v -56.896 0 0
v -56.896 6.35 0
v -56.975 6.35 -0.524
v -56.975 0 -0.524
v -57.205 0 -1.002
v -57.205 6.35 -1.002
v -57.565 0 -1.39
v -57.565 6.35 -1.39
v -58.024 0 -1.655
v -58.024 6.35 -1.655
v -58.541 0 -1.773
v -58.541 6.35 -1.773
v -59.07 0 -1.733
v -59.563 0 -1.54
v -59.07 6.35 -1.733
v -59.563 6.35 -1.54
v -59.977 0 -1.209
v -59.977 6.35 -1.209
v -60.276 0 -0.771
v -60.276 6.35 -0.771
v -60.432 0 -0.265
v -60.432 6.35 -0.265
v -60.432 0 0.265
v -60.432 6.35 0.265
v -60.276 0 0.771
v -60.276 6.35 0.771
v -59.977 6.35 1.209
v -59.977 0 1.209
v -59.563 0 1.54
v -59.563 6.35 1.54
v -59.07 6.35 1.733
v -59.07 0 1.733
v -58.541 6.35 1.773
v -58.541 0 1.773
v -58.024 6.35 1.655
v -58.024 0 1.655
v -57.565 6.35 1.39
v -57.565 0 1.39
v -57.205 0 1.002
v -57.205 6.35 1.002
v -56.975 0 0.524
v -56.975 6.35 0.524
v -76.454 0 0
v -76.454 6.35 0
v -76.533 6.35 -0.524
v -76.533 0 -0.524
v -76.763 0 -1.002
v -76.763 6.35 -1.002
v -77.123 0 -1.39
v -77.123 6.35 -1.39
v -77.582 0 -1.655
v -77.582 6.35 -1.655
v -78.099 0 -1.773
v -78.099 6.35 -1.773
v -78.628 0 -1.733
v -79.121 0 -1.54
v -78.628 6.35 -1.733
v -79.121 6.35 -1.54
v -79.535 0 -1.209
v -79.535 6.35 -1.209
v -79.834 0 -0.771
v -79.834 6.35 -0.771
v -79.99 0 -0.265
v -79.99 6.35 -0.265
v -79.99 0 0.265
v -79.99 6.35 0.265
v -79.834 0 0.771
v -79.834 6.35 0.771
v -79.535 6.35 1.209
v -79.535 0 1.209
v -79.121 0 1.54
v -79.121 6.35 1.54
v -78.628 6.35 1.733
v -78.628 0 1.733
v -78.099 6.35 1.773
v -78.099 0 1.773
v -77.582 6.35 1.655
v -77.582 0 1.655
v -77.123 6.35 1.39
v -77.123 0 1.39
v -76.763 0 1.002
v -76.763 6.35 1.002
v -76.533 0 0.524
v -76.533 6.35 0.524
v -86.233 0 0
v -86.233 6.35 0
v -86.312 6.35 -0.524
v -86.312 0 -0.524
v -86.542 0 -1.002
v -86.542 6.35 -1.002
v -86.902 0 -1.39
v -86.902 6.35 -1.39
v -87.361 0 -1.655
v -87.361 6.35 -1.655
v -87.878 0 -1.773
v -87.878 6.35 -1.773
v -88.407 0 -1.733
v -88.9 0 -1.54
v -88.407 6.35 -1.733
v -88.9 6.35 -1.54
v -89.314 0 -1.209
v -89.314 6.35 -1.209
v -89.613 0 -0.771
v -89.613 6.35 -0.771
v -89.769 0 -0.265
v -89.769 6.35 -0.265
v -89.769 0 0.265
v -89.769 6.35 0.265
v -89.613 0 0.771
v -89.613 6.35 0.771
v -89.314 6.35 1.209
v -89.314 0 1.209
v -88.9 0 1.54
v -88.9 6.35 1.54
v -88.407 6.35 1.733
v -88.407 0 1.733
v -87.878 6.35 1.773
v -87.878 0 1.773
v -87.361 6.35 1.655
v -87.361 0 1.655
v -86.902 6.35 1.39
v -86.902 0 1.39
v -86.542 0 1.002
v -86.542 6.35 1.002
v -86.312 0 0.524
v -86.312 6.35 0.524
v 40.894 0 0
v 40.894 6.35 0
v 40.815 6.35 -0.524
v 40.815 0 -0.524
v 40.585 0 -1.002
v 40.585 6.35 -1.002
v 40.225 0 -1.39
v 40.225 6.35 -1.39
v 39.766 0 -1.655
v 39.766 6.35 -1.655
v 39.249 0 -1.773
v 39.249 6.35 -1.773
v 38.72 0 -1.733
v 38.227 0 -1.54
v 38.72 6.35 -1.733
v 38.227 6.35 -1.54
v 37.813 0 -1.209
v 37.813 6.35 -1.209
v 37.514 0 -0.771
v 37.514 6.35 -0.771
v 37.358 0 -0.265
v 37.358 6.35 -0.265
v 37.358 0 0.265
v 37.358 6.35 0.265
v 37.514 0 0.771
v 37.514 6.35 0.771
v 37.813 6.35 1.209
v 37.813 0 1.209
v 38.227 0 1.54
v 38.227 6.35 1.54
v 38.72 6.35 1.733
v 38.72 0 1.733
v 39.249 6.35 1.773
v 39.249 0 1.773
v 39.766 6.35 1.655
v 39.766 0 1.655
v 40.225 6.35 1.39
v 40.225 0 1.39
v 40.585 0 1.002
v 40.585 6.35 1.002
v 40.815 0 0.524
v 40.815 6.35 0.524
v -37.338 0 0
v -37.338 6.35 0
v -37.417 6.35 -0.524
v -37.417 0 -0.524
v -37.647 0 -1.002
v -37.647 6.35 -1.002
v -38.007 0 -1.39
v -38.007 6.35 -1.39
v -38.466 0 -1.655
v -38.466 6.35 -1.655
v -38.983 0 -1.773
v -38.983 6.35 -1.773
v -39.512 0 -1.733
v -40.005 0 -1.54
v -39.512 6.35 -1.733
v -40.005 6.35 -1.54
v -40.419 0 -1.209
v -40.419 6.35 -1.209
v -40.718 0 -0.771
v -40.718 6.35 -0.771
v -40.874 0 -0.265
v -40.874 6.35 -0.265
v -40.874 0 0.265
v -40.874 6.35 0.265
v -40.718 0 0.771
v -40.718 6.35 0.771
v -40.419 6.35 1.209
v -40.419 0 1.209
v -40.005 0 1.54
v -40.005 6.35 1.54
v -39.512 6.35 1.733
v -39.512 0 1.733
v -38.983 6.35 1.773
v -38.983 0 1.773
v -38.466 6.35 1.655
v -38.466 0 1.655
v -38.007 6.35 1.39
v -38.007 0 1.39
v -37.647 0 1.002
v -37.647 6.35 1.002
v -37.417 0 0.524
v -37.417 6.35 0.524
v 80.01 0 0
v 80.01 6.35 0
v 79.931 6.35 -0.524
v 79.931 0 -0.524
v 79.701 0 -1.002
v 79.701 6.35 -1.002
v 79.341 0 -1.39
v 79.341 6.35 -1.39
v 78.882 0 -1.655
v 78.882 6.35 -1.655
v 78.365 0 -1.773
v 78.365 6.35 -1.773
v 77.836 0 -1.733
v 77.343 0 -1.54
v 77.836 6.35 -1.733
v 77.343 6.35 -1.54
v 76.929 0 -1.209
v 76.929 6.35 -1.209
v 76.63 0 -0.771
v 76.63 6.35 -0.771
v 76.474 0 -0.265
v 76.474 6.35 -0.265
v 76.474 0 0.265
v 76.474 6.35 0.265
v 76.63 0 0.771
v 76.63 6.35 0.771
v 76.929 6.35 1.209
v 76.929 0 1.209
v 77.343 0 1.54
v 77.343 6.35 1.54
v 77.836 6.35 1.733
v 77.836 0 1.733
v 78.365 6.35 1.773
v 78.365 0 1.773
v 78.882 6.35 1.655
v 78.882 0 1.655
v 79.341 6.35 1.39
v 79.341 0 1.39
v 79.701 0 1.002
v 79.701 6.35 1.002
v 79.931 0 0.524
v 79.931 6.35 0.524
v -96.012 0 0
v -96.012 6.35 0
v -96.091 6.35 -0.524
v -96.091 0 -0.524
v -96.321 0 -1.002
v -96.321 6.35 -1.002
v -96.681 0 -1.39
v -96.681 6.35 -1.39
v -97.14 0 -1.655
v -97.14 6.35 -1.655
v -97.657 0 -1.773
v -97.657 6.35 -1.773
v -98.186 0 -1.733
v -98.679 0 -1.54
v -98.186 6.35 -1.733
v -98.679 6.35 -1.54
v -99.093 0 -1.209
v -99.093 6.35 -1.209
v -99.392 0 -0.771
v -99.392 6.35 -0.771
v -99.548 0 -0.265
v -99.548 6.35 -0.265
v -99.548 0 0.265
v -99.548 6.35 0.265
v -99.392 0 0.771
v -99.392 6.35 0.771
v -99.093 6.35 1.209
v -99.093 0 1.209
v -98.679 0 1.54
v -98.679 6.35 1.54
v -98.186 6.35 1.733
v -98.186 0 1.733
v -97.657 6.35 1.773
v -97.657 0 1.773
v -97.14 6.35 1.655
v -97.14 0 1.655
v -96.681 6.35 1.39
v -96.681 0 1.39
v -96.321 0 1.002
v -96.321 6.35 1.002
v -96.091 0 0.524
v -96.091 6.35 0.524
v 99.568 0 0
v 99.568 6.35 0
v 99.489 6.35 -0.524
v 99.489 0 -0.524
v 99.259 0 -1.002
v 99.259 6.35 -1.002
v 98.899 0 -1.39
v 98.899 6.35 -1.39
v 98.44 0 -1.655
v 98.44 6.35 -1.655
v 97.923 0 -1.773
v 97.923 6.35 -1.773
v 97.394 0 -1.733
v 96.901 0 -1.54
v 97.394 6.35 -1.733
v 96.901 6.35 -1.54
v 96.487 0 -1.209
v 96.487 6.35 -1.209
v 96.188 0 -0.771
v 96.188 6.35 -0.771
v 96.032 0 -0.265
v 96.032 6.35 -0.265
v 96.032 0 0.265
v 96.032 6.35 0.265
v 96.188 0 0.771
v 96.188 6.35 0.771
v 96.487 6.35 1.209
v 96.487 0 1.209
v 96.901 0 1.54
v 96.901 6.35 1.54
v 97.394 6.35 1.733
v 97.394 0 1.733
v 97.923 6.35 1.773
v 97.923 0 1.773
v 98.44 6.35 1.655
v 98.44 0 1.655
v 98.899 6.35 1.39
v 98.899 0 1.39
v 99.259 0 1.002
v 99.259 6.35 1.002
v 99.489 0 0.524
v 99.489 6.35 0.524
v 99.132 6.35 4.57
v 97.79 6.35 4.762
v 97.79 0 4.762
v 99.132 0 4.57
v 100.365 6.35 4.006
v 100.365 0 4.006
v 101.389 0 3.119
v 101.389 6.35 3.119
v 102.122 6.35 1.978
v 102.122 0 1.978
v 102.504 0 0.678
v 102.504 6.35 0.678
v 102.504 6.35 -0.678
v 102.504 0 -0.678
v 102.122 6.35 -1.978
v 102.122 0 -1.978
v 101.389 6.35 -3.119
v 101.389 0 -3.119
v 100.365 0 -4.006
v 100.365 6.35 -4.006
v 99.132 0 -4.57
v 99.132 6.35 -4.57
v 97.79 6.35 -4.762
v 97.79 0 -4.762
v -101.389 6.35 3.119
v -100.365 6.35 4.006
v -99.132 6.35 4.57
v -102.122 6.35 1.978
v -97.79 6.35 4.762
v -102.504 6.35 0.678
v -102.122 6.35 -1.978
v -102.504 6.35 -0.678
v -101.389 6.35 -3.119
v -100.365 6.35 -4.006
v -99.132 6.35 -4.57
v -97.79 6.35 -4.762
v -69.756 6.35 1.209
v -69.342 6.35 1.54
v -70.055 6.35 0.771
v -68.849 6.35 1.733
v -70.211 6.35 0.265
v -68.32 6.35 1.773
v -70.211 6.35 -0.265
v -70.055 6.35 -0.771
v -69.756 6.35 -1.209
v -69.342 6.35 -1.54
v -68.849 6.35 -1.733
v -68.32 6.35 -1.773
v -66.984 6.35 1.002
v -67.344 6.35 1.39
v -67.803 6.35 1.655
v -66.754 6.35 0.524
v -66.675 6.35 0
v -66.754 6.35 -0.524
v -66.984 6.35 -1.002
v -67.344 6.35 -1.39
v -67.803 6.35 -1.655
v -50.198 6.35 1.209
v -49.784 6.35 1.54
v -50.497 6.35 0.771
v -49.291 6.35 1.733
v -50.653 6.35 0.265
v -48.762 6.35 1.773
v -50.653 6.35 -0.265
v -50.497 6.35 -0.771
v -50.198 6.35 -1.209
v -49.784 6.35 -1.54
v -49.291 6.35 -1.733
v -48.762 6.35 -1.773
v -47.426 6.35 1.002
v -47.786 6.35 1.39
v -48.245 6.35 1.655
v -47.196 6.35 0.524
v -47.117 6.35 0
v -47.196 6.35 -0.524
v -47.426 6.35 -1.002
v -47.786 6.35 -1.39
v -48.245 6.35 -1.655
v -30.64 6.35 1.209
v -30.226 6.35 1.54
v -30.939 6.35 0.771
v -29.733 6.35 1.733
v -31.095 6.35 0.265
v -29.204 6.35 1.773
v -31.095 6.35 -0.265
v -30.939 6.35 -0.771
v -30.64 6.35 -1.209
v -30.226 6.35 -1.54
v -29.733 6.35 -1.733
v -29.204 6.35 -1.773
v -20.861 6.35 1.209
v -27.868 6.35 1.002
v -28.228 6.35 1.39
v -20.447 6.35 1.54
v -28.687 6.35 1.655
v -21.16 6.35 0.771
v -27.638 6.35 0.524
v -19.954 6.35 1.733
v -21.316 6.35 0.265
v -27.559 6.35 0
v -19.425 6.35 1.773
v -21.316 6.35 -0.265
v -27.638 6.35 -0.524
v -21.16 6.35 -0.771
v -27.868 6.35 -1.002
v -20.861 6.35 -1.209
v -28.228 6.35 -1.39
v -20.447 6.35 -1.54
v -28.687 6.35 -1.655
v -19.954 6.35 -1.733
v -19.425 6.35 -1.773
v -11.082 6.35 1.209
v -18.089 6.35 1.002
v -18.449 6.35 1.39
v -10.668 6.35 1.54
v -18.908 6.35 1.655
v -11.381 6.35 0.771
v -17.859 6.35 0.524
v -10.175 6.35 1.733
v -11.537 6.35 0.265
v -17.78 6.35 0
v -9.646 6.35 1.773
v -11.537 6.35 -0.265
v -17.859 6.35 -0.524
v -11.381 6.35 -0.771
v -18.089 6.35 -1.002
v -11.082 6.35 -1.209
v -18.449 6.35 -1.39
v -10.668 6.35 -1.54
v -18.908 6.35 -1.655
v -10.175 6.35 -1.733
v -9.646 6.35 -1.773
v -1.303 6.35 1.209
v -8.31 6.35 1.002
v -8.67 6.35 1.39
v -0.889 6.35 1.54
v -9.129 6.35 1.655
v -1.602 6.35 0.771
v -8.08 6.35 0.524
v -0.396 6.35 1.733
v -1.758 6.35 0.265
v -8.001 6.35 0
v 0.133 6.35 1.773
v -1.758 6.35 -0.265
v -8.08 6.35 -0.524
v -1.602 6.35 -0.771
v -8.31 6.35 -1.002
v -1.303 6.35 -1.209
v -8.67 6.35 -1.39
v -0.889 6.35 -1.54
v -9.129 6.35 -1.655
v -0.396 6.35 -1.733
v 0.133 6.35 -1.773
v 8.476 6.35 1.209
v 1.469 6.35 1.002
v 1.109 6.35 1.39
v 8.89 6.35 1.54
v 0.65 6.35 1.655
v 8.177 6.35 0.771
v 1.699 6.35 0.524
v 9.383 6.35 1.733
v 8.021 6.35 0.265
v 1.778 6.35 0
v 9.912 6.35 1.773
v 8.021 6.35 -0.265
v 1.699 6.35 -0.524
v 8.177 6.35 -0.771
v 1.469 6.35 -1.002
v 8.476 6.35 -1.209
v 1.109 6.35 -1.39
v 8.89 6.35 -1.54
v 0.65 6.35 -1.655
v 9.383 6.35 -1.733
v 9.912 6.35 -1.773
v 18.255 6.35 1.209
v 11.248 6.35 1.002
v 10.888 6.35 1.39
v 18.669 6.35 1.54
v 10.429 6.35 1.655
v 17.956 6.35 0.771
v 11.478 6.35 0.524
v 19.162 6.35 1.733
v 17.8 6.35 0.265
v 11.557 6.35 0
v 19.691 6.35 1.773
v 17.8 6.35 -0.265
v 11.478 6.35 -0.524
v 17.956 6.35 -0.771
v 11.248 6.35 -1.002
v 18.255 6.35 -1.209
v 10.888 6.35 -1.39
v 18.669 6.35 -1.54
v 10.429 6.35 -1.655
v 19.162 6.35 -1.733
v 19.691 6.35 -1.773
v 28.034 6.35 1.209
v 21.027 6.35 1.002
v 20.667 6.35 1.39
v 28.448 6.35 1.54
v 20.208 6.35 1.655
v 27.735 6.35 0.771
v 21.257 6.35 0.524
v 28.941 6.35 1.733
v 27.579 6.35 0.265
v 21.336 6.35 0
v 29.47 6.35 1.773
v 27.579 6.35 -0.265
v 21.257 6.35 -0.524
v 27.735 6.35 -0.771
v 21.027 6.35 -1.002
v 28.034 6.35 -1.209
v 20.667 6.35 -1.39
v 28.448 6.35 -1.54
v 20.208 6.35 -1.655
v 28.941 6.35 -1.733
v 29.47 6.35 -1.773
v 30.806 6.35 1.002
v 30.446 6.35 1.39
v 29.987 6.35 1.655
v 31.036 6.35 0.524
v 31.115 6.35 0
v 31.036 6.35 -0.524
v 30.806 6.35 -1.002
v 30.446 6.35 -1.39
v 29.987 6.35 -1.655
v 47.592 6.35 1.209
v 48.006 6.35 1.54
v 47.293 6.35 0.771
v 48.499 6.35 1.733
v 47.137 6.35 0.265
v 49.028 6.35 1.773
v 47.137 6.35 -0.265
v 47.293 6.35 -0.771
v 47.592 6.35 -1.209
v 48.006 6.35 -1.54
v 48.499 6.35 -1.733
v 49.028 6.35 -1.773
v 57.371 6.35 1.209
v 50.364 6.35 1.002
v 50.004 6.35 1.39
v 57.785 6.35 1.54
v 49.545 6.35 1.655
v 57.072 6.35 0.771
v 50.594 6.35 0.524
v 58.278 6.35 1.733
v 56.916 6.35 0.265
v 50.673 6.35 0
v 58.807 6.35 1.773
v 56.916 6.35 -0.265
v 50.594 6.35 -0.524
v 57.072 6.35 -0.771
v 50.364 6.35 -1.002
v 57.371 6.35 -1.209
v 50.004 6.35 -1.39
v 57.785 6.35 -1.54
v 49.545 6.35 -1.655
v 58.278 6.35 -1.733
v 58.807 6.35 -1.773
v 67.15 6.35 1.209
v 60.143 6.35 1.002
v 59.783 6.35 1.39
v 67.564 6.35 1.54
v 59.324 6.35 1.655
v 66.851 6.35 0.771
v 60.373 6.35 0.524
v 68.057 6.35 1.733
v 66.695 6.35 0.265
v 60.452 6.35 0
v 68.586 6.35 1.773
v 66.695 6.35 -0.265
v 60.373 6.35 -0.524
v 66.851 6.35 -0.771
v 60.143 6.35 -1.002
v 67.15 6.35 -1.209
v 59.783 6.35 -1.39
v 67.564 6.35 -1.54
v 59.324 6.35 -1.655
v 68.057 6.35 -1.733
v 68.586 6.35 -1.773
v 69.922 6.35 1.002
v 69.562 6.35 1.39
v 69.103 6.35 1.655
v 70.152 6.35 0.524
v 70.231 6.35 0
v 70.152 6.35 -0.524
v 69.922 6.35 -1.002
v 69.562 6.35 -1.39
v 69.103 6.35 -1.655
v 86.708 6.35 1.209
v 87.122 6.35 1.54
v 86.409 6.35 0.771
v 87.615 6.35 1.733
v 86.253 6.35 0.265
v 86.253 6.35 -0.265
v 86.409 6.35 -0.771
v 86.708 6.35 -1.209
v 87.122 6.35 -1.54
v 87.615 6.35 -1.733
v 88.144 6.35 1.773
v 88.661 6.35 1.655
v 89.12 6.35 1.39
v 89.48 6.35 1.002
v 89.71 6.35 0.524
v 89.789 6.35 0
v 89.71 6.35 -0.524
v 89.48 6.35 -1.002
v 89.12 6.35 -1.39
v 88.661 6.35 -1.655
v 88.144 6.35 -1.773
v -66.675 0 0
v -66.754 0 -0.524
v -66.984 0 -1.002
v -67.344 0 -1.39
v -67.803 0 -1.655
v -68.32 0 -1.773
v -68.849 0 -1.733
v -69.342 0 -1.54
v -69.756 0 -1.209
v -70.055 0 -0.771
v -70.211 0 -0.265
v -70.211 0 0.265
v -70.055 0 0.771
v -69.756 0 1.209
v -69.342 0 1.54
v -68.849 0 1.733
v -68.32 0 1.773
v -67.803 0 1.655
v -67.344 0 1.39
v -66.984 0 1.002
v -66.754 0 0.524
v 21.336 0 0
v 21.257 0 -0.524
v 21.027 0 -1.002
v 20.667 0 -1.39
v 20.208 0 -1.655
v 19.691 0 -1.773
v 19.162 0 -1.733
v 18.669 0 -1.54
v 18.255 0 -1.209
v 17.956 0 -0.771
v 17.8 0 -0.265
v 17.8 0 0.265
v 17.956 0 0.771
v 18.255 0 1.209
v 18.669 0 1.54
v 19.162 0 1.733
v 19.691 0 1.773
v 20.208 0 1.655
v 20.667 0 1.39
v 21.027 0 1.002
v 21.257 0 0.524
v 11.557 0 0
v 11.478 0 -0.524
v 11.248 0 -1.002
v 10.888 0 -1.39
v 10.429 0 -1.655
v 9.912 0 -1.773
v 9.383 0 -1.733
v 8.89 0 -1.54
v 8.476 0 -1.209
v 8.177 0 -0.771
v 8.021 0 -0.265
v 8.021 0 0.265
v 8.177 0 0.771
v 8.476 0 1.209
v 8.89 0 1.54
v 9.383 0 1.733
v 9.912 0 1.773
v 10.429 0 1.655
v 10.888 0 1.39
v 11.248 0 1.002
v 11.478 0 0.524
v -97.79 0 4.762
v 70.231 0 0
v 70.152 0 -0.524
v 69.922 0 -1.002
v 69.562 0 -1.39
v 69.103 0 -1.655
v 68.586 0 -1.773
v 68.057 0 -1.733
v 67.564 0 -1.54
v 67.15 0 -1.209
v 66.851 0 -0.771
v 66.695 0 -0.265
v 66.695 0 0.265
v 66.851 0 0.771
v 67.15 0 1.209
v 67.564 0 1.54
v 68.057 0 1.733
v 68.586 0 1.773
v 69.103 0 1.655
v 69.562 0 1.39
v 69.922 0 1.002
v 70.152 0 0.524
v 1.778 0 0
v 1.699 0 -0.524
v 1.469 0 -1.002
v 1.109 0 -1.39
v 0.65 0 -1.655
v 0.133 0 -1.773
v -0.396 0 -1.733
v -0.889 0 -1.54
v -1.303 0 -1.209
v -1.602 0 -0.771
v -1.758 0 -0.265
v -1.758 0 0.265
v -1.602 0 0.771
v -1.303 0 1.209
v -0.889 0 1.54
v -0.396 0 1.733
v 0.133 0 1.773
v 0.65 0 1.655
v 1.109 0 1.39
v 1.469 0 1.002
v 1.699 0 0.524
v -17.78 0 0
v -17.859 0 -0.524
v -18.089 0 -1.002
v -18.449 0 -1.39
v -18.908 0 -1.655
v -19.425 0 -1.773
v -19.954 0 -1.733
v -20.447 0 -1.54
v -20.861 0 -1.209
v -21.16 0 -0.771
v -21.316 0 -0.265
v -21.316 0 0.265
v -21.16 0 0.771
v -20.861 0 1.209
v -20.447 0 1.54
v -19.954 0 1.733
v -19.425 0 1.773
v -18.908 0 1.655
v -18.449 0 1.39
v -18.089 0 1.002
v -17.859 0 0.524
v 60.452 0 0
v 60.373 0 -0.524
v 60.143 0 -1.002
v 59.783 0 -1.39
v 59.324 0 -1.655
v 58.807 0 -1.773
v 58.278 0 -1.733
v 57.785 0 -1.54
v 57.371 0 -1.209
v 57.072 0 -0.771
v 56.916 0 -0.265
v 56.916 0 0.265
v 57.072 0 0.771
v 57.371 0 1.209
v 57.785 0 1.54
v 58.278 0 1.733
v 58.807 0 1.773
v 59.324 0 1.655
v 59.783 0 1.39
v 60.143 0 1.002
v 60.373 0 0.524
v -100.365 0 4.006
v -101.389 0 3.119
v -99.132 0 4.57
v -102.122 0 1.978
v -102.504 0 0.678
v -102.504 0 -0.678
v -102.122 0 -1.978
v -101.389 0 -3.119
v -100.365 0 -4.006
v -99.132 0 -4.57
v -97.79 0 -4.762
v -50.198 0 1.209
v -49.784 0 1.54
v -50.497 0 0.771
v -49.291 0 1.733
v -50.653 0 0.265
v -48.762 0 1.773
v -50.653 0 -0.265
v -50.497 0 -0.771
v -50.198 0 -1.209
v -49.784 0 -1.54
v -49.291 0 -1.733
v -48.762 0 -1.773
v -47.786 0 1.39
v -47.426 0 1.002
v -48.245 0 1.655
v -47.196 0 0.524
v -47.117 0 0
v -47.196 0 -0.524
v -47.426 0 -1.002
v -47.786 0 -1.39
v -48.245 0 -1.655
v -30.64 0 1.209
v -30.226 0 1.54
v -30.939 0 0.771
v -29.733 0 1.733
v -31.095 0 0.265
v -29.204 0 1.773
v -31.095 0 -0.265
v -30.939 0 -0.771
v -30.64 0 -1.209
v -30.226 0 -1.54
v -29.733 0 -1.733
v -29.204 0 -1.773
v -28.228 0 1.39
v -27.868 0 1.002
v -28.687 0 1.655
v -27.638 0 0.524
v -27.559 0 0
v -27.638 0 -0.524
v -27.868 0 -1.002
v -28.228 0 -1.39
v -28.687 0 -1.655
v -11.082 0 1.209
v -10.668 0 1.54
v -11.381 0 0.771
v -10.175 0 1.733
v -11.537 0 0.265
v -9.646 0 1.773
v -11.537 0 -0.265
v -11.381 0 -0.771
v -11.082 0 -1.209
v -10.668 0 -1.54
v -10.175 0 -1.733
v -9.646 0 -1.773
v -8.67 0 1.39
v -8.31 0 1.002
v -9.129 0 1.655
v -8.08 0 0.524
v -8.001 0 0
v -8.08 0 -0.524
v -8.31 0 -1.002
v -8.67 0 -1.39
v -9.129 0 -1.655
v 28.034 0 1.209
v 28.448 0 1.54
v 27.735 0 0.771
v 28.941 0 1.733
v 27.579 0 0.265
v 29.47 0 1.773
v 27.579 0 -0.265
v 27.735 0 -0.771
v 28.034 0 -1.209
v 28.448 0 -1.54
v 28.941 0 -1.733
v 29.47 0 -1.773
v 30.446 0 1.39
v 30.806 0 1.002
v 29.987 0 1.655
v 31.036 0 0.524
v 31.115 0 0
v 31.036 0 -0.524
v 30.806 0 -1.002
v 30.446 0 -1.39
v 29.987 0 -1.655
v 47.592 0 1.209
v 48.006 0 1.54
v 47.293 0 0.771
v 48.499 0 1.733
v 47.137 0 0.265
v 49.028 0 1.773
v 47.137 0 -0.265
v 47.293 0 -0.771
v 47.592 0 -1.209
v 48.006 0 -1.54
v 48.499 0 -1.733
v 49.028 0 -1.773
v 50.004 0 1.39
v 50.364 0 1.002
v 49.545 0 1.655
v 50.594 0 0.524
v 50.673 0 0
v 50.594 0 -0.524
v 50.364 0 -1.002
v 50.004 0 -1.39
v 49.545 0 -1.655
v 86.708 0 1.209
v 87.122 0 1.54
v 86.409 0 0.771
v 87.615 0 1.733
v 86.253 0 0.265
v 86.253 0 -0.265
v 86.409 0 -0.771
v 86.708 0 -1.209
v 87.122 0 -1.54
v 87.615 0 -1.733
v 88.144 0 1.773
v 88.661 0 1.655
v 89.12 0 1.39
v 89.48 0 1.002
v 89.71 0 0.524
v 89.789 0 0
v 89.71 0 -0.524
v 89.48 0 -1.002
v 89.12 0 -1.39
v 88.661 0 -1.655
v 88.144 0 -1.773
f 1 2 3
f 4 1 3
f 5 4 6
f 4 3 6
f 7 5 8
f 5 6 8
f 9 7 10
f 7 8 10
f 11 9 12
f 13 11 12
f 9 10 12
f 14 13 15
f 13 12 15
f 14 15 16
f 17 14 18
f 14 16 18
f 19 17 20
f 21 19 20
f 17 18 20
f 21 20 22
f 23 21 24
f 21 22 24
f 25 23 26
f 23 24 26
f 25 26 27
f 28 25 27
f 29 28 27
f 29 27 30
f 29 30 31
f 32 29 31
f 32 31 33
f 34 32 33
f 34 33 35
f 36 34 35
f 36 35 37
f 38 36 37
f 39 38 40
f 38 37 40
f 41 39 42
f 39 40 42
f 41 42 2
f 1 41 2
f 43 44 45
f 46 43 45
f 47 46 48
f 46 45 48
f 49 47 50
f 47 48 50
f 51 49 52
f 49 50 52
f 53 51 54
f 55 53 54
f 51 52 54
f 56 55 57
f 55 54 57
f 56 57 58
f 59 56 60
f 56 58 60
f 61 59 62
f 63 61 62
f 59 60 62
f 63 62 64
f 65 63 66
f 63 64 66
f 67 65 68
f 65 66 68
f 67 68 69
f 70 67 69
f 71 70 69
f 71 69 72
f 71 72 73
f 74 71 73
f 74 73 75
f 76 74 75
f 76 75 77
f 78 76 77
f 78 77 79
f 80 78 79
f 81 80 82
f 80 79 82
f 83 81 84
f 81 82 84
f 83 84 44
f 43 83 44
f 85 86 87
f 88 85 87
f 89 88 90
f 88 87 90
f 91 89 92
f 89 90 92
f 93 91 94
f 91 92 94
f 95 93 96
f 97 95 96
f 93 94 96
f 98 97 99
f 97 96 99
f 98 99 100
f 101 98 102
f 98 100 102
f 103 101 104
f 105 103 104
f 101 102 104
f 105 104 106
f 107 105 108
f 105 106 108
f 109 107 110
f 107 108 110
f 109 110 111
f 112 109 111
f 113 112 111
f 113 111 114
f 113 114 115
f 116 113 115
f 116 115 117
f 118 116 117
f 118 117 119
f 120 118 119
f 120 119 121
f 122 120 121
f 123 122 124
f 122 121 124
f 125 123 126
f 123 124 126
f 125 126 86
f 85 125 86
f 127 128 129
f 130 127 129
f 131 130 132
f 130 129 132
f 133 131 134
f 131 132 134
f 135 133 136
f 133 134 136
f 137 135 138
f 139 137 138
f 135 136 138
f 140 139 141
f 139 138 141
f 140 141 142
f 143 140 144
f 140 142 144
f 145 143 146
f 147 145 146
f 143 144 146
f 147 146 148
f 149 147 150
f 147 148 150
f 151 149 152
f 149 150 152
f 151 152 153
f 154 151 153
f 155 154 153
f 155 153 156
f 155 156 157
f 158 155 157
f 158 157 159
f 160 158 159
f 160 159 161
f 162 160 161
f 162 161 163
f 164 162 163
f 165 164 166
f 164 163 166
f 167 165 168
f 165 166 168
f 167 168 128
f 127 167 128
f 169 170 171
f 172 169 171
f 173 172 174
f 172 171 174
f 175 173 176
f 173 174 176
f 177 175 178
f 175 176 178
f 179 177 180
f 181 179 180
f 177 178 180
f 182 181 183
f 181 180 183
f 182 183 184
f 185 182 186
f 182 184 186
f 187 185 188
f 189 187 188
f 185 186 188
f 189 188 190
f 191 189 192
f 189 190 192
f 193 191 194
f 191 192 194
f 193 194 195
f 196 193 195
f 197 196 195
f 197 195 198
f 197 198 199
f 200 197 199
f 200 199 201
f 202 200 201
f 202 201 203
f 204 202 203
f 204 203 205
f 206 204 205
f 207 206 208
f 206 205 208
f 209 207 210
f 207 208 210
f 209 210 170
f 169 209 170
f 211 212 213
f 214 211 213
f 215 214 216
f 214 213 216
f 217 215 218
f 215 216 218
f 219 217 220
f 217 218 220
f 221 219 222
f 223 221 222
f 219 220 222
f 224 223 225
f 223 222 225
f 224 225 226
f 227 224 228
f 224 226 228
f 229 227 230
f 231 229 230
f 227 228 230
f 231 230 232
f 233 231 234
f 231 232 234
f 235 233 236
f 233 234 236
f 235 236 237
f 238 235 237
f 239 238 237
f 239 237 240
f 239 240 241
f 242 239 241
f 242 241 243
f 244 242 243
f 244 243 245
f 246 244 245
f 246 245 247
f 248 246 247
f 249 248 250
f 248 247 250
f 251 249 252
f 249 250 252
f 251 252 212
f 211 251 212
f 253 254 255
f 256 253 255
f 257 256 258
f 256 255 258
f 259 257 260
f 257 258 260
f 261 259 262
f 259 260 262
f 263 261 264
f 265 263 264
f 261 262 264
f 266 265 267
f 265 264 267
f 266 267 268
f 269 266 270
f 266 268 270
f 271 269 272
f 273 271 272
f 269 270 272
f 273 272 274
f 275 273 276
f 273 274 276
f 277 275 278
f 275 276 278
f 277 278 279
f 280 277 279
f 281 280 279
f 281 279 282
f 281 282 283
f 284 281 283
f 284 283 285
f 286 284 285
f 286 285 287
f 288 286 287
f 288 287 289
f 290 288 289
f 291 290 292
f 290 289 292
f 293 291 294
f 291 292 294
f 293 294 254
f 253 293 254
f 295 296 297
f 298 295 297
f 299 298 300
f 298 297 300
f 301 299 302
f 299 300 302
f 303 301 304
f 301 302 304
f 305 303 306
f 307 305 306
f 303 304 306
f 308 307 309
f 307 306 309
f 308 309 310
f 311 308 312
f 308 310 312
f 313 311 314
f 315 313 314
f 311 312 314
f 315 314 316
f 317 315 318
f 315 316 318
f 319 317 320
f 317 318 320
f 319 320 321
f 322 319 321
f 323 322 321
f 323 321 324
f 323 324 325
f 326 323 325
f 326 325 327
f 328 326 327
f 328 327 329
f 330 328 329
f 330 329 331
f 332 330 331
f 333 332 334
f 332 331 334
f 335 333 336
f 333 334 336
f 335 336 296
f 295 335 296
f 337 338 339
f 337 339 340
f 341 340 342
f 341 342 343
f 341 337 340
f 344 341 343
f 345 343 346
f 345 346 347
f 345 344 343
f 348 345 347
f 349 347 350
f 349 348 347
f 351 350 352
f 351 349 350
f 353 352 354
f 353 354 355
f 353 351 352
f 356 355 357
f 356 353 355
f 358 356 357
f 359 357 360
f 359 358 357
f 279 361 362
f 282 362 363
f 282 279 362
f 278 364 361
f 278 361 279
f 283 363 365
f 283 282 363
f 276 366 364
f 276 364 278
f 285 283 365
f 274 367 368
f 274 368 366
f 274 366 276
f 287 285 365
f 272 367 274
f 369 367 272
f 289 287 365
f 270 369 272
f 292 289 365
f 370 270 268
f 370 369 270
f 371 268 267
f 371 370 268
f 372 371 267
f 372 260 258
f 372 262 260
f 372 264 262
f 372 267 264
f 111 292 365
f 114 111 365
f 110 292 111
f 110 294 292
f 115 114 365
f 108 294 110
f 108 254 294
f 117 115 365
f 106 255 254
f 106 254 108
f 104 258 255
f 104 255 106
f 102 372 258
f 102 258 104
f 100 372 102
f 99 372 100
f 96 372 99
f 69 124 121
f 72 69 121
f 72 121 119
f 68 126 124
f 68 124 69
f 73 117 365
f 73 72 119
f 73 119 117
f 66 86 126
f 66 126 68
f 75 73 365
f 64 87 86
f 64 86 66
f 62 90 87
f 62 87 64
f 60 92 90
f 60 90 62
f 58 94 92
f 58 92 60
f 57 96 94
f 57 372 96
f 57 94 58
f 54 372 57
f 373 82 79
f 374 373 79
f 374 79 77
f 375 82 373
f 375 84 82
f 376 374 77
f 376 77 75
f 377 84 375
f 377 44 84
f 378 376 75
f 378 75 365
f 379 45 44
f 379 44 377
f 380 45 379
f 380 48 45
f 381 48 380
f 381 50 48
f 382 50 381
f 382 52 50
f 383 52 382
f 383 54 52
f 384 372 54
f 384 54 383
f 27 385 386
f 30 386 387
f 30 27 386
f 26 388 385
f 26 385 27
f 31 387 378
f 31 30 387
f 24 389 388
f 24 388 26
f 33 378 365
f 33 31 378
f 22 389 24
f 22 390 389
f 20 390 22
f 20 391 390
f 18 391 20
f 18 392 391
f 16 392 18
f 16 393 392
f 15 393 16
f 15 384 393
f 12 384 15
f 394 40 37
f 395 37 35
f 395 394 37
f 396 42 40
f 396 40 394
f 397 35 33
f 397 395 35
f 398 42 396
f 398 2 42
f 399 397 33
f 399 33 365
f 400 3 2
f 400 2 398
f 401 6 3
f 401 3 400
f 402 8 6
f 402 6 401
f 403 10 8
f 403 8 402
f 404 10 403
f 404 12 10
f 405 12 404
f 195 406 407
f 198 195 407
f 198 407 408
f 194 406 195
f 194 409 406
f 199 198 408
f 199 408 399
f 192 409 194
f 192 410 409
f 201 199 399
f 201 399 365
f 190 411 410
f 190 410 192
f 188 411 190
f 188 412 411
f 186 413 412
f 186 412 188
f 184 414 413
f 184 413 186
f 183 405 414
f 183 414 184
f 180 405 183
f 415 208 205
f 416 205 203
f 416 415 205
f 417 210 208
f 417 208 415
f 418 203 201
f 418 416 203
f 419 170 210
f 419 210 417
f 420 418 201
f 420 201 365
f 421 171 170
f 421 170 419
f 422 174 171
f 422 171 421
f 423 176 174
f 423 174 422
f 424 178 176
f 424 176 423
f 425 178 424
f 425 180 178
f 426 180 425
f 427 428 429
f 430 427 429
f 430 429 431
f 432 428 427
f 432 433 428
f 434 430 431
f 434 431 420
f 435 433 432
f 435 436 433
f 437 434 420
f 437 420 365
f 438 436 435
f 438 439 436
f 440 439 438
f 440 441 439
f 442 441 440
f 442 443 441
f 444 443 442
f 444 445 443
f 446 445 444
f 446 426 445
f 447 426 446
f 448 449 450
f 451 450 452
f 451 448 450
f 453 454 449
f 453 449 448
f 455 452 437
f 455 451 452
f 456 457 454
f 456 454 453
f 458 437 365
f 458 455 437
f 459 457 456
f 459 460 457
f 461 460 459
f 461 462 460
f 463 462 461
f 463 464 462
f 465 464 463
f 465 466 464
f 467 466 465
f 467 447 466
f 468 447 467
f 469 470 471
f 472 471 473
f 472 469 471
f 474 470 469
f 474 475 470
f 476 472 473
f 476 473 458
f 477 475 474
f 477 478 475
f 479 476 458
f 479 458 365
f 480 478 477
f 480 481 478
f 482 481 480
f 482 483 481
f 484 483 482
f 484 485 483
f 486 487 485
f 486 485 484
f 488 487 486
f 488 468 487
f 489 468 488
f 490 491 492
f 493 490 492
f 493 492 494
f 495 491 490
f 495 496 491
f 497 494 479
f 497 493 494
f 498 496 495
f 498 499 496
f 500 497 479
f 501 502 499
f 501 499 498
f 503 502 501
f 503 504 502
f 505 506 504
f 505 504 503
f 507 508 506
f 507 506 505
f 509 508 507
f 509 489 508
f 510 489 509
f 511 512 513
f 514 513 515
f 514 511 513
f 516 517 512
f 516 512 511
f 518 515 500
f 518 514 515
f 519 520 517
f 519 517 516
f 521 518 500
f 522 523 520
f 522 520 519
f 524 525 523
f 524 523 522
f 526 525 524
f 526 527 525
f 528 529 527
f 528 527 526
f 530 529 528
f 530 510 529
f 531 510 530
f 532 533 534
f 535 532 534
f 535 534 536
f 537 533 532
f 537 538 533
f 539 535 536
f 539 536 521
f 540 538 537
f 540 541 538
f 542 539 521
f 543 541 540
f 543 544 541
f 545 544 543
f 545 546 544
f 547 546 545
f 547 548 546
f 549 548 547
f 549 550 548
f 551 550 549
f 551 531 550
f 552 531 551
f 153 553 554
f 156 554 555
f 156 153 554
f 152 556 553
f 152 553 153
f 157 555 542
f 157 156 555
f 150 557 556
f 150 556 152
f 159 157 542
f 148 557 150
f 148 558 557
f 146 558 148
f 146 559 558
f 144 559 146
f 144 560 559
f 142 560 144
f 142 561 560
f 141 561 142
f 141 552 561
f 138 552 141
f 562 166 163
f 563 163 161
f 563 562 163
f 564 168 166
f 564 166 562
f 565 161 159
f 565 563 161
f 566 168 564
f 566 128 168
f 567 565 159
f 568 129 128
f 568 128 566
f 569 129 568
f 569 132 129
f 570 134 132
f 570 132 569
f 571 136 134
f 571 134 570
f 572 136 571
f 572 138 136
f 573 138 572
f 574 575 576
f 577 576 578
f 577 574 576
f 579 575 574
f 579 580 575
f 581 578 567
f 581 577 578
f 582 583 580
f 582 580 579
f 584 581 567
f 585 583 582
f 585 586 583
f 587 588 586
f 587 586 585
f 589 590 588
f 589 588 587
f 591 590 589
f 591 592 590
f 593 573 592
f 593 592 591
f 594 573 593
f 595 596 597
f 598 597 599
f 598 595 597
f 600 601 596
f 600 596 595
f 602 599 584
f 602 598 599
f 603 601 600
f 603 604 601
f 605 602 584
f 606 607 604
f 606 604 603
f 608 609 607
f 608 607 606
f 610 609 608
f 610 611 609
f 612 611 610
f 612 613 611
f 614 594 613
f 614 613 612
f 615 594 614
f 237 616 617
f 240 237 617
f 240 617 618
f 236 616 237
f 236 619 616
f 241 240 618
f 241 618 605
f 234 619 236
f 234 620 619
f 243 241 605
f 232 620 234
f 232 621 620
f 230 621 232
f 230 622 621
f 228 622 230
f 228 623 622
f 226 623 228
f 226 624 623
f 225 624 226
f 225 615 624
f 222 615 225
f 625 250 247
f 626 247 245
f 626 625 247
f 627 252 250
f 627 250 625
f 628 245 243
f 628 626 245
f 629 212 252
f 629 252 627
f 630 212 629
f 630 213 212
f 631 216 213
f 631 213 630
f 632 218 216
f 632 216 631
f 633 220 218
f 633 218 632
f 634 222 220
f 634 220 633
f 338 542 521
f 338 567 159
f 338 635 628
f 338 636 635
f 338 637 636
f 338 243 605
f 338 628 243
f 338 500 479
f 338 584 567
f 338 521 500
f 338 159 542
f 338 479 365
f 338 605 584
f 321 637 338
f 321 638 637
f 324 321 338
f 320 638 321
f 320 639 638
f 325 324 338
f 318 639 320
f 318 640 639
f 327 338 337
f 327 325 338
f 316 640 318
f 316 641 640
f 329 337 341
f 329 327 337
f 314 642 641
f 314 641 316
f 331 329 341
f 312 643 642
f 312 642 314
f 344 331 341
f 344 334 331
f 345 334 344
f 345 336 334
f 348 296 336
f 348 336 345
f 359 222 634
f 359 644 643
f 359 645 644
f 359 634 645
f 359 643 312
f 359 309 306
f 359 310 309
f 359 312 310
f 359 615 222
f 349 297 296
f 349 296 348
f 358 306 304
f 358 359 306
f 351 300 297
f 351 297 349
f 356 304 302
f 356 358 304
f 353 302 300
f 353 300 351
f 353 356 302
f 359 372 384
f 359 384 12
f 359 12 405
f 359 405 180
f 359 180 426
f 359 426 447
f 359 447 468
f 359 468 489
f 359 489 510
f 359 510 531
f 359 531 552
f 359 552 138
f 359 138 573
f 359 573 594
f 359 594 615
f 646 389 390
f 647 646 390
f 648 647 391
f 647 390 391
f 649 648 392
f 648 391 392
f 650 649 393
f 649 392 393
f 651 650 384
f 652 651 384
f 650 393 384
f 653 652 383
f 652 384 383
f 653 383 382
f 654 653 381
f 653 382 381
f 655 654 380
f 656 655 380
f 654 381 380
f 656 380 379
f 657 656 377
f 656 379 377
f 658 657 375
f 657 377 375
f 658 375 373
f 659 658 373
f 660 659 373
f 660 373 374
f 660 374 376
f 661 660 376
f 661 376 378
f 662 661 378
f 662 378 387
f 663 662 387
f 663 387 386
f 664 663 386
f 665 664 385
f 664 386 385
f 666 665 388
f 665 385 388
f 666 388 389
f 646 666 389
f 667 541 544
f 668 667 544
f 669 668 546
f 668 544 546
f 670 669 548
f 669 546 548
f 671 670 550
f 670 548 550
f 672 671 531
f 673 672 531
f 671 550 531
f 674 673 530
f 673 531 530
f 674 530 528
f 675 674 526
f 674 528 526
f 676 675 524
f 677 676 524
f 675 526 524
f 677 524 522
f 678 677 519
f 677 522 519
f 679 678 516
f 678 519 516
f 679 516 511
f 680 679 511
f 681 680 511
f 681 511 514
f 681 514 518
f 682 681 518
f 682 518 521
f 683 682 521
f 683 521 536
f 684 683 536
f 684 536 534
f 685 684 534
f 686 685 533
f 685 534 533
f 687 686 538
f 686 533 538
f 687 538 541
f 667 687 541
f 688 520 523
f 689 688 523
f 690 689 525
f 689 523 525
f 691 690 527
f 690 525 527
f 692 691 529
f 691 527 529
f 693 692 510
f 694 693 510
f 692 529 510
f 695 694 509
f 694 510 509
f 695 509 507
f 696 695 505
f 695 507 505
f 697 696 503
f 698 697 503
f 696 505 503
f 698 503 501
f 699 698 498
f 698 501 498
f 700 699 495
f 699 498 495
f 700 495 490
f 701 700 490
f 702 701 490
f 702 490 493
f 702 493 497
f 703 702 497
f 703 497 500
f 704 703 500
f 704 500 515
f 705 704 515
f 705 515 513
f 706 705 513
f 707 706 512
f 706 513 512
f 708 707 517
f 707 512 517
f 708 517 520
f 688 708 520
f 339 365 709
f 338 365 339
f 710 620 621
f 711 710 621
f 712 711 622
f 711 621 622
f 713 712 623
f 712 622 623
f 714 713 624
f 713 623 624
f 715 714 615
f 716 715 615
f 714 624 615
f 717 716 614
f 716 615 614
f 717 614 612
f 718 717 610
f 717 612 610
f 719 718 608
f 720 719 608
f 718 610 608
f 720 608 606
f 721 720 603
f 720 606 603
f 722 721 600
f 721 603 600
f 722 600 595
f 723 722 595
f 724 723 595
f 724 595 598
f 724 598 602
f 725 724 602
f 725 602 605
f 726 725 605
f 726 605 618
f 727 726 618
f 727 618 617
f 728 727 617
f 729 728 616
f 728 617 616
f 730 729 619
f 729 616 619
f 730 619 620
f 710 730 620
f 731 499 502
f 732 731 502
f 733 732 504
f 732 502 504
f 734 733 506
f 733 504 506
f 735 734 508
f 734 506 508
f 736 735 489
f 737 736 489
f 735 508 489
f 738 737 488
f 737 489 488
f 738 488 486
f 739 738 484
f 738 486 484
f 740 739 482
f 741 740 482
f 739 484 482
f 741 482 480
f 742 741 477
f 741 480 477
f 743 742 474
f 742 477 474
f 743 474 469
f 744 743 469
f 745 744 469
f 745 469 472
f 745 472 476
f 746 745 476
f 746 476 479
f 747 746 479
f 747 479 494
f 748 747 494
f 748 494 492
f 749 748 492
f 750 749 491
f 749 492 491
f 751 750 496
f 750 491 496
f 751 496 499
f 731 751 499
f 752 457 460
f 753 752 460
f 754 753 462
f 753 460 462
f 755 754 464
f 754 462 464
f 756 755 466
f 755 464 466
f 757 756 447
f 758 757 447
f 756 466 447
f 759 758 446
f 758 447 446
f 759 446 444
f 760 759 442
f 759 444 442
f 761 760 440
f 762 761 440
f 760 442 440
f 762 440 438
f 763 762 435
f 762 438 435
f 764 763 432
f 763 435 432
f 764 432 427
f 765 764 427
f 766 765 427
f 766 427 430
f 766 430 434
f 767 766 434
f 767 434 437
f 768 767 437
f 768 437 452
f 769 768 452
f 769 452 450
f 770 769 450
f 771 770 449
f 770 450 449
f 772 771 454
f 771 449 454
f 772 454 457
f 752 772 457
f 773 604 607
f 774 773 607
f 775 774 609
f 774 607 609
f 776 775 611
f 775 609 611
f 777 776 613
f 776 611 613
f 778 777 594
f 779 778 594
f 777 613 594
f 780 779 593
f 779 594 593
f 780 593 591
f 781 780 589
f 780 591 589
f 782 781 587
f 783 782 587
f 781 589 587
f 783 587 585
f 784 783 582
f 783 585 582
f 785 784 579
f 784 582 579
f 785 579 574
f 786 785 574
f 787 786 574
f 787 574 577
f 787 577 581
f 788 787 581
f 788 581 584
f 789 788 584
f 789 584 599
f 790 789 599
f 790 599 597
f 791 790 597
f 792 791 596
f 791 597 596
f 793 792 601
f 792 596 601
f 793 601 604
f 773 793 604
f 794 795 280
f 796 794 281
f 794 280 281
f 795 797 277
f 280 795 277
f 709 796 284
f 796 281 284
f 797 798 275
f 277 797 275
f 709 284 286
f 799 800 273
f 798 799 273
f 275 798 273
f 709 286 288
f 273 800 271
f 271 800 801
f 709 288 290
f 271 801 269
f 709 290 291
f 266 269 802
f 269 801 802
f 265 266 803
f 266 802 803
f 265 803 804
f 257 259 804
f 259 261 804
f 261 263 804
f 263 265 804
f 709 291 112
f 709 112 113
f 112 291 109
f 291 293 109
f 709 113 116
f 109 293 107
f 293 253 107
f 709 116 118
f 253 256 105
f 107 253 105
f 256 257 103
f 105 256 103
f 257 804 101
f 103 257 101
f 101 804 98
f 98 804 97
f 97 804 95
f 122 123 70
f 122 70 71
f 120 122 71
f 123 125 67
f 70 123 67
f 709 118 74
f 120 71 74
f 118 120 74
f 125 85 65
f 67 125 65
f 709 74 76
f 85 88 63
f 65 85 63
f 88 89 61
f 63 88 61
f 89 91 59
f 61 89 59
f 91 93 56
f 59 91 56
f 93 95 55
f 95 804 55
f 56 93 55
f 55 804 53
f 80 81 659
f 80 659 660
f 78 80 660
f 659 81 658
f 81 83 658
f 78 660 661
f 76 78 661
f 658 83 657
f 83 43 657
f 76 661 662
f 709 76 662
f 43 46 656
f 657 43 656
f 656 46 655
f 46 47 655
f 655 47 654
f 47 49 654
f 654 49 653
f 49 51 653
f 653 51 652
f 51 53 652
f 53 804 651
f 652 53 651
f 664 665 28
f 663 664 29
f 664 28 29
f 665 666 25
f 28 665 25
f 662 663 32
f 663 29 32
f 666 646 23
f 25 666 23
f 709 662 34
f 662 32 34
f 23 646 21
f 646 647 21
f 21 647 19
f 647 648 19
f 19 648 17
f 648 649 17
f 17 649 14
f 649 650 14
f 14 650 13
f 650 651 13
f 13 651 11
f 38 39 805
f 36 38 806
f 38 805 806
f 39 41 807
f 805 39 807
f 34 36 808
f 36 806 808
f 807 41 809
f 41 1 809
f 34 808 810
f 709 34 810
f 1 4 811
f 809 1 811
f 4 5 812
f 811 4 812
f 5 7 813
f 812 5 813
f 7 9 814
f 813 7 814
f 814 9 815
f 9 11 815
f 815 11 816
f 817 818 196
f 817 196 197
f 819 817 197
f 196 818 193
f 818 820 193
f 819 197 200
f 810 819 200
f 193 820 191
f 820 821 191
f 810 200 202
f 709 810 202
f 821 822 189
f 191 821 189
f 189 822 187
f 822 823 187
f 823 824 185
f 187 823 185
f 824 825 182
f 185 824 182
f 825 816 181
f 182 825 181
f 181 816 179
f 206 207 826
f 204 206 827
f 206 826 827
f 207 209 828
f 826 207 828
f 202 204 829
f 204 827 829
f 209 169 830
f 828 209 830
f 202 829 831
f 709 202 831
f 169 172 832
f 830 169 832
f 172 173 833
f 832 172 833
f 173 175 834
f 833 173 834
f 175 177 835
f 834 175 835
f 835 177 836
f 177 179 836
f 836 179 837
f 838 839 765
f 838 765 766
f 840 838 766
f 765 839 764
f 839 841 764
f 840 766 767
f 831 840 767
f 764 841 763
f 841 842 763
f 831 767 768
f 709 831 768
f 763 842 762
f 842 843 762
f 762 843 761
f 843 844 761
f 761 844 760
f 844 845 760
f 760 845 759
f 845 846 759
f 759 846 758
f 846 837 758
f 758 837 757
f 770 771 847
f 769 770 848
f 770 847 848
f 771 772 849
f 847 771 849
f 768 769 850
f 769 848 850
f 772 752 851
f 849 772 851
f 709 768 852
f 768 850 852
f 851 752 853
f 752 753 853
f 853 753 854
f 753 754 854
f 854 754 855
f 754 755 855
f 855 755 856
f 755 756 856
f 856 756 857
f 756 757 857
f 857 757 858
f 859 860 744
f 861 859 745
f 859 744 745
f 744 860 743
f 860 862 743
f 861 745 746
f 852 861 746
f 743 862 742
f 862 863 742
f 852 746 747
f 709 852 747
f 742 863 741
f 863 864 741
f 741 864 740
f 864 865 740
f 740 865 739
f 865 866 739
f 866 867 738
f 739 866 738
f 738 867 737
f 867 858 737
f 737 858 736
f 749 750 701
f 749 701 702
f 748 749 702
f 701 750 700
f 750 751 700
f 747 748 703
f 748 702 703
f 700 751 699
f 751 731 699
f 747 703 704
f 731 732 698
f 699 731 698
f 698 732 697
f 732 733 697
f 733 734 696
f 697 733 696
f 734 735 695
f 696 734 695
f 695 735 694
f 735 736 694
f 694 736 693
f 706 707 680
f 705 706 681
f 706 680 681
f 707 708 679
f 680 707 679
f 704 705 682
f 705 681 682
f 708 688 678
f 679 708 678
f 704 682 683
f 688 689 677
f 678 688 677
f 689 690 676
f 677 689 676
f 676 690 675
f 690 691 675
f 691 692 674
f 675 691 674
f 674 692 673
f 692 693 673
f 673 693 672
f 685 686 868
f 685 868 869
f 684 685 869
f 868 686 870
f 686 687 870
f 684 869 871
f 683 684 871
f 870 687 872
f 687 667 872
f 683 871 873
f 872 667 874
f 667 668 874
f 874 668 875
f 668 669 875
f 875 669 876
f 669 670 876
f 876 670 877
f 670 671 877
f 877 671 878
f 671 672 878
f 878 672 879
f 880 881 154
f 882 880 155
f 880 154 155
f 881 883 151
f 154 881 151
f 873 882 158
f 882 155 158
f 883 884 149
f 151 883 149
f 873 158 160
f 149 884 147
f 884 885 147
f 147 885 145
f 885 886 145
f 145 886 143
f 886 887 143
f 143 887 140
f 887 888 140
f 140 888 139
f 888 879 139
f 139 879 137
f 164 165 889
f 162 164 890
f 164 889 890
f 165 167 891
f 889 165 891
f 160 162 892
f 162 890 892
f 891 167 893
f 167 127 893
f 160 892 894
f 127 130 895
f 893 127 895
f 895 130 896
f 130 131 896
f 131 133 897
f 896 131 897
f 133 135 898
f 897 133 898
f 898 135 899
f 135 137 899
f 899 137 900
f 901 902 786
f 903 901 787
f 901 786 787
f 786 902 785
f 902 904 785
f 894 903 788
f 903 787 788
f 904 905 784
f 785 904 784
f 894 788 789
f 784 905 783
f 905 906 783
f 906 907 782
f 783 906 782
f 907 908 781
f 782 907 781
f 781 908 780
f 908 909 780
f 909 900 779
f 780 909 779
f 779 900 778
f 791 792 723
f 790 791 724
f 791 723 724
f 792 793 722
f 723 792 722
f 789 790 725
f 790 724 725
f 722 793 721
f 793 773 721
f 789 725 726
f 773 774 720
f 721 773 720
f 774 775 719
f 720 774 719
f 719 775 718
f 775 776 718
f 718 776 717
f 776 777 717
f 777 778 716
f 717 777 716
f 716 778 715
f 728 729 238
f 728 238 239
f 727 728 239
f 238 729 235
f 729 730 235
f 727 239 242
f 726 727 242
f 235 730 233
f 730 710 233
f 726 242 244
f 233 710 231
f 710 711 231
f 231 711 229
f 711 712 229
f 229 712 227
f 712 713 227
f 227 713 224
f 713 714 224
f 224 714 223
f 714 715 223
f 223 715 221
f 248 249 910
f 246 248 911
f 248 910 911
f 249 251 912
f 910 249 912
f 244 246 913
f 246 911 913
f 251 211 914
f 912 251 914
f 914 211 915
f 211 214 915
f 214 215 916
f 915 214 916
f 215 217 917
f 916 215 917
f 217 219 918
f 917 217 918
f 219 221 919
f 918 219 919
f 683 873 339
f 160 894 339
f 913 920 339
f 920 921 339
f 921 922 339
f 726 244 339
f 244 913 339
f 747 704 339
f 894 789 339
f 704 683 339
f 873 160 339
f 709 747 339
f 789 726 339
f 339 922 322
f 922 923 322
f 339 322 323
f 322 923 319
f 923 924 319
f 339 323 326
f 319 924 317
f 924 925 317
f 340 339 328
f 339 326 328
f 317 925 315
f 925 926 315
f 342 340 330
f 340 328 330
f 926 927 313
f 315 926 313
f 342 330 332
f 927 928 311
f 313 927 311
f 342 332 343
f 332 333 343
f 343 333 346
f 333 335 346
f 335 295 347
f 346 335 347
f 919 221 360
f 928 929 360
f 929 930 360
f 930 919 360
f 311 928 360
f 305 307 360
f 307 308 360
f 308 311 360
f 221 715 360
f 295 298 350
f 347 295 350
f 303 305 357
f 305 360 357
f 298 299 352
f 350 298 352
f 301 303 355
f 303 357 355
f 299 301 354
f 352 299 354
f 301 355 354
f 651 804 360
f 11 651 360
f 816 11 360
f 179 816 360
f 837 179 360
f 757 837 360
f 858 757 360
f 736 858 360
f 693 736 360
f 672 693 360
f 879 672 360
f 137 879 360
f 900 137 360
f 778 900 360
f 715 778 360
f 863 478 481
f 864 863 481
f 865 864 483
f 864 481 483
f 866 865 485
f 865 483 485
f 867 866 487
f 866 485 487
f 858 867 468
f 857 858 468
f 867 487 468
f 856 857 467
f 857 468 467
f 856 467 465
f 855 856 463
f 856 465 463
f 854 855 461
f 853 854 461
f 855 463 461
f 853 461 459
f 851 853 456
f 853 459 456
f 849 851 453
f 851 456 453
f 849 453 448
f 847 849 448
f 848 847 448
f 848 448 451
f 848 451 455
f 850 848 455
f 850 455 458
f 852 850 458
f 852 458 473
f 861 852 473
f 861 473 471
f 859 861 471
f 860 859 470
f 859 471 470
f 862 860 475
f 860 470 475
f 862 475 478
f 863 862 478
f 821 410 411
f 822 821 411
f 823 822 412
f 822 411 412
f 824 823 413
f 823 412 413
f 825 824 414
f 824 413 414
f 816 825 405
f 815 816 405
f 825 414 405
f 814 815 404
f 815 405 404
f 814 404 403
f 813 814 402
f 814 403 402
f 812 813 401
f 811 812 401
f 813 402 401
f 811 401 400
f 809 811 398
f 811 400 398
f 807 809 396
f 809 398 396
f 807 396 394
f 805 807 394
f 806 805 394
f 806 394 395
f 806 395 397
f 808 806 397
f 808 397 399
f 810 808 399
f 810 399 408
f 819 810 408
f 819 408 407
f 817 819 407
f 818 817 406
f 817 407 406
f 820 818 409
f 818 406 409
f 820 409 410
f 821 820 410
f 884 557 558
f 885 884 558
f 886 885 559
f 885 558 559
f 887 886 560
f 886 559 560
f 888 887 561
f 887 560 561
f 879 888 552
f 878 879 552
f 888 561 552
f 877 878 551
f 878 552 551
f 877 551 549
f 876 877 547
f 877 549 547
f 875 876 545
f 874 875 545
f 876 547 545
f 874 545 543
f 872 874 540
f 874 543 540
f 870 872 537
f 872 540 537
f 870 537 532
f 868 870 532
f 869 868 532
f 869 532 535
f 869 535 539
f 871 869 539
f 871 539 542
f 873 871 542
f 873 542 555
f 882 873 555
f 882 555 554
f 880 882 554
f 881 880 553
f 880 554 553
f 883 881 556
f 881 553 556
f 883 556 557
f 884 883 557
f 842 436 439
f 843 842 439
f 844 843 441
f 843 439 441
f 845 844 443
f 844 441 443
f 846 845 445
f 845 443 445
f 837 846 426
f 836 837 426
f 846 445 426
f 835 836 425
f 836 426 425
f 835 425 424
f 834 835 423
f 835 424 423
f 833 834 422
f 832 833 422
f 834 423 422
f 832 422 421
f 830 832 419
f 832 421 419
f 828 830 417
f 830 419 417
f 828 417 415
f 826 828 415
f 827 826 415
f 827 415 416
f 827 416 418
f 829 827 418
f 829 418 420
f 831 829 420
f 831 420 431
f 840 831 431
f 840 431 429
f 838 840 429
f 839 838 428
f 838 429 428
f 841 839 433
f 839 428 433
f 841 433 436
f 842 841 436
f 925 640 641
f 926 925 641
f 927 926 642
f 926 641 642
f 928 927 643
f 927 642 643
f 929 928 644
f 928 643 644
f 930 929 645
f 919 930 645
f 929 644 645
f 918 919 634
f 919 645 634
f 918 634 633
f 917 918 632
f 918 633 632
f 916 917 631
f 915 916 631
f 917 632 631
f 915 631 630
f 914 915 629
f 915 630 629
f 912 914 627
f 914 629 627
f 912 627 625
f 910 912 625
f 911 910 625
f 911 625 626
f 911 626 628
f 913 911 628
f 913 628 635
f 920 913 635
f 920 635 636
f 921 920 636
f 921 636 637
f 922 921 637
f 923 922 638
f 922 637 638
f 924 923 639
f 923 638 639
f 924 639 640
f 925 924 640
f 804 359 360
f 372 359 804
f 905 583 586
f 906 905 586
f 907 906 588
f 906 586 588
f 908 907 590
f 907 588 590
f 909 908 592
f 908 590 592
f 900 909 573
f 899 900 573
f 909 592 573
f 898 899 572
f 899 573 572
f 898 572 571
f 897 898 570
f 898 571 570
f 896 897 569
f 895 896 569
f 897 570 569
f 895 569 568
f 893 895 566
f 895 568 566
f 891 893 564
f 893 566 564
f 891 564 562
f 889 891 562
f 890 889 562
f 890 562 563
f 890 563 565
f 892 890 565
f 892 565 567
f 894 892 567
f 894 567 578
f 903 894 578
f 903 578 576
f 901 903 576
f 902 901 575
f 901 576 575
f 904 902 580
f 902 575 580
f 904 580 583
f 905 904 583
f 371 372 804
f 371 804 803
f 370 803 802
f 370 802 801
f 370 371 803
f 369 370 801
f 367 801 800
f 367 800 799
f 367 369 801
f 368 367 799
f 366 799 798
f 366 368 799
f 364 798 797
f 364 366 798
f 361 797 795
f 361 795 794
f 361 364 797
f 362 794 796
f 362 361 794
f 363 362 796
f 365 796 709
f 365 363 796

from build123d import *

# Parameters (mm, degrees)
SKETCH1_R           = 1.778
BOSS_EXTRUDE1_DEPTH = 6.35


with BuildPart() as part:
    # Sketch1 → Boss-Extrude1 (new body)
    with BuildSketch(Plane(origin=(0, 6.35, 0), x_dir=(1, 0, 0), z_dir=(0, 1, 0))):
        with BuildLine():
            Line((97.79, 4.7625), (-97.79, 4.7625))
            ThreePointArc((-97.79, 4.7625), (-102.5525, 0), (-97.79, -4.7625))
            Line((-97.79, -4.7625), (97.79, -4.7625))
            ThreePointArc((97.79, -4.7625), (102.5525, 0), (97.79, 4.7625))
        make_face()
        with Locations((97.79, 0)):
            Circle(SKETCH1_R, mode=Mode.SUBTRACT)
        with Locations((88.011, 0)):
            Circle(SKETCH1_R, mode=Mode.SUBTRACT)
        with Locations((78.232, 0)):
            Circle(SKETCH1_R, mode=Mode.SUBTRACT)
        with Locations((68.453, 0)):
            Circle(SKETCH1_R, mode=Mode.SUBTRACT)
        with Locations((58.674, 0)):
            Circle(SKETCH1_R, mode=Mode.SUBTRACT)
        with Locations((48.895, 0)):
            Circle(SKETCH1_R, mode=Mode.SUBTRACT)
        with Locations((39.116, 0)):
            Circle(SKETCH1_R, mode=Mode.SUBTRACT)
        with Locations((29.337, 0)):
            Circle(SKETCH1_R, mode=Mode.SUBTRACT)
        with Locations((19.558, 0)):
            Circle(SKETCH1_R, mode=Mode.SUBTRACT)
        with Locations((9.779, 0)):
            Circle(SKETCH1_R, mode=Mode.SUBTRACT)
        Circle(SKETCH1_R, mode=Mode.SUBTRACT)
        with Locations((-9.779, 0)):
            Circle(SKETCH1_R, mode=Mode.SUBTRACT)
        with Locations((-19.558, 0)):
            Circle(SKETCH1_R, mode=Mode.SUBTRACT)
        with Locations((-29.337, 0)):
            Circle(SKETCH1_R, mode=Mode.SUBTRACT)
        with Locations((-39.116, 0)):
            Circle(SKETCH1_R, mode=Mode.SUBTRACT)
        with Locations((-48.895, 0)):
            Circle(SKETCH1_R, mode=Mode.SUBTRACT)
        with Locations((-58.674, 0)):
            Circle(SKETCH1_R, mode=Mode.SUBTRACT)
        with Locations((-68.453, 0)):
            Circle(SKETCH1_R, mode=Mode.SUBTRACT)
        with Locations((-78.232, 0)):
            Circle(SKETCH1_R, mode=Mode.SUBTRACT)
        with Locations((-88.011, 0)):
            Circle(SKETCH1_R, mode=Mode.SUBTRACT)
        with Locations((-97.79, 0)):
            Circle(SKETCH1_R, mode=Mode.SUBTRACT)
    extrude(amount=-BOSS_EXTRUDE1_DEPTH)


solid = part.part
